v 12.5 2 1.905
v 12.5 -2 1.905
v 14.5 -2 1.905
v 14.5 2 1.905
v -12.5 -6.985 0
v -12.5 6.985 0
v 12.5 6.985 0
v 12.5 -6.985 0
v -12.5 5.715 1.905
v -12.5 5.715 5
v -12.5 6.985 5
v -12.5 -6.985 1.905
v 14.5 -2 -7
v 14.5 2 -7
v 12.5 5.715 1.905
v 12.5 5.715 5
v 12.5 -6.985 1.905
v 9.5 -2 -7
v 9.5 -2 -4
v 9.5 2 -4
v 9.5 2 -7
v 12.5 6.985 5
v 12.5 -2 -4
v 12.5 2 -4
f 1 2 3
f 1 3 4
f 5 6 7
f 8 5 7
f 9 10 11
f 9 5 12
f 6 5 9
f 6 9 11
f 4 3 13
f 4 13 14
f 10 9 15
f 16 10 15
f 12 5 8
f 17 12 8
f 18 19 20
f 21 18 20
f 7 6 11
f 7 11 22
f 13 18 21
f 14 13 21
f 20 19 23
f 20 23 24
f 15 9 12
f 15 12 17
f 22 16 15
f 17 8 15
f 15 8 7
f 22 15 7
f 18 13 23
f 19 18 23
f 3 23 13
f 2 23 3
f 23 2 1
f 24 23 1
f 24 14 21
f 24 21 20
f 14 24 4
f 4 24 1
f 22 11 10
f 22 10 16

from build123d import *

# Parameters (mm, degrees)
F0_W     = 25
F0_H     = 12.7
F1_DEPTH = 1.905
F0_H_2   = 1.27
F2_DEPTH = 5
F4_START = 12.5
F3_W     = 4
F3_H     = 1.905
F3_H_2   = 4
F4_DEPTH = 2
F5_START = 9.5
F3_H_3   = 3
F5_DEPTH = 5


with BuildPart() as f1:
    # F0 (on Top) → F1 (new body)
    with BuildSketch(Plane.XY):
        with Locations((0, -0.635)):
            Rectangle(F0_W, F0_H)
    extrude(amount=F1_DEPTH)

    # F0 (on Top) → F2 (join)
    with BuildSketch(Plane.XY):
        with Locations((0, 6.35)):
            Rectangle(F0_W, F0_H_2)
    extrude(amount=F2_DEPTH)


with BuildPart() as f4:
    # F3 (on Right) → F4 (new body)
    with BuildSketch(Plane.YZ.offset(F4_START)):
        with Locations((0, 0.9525)):
            Rectangle(F3_W, F3_H)
        with Locations((0, -2)):
            Rectangle(F3_W, F3_H_2)
    extrude(amount=F4_DEPTH)

    # F3 (on Right) → F5 (join)
    with BuildSketch(Plane.YZ.offset(F5_START)):
        with Locations((0, -5.5)):
            Rectangle(F3_W, F3_H_3)
    extrude(amount=F5_DEPTH)


solid = Compound([f1.part, f4.part])
